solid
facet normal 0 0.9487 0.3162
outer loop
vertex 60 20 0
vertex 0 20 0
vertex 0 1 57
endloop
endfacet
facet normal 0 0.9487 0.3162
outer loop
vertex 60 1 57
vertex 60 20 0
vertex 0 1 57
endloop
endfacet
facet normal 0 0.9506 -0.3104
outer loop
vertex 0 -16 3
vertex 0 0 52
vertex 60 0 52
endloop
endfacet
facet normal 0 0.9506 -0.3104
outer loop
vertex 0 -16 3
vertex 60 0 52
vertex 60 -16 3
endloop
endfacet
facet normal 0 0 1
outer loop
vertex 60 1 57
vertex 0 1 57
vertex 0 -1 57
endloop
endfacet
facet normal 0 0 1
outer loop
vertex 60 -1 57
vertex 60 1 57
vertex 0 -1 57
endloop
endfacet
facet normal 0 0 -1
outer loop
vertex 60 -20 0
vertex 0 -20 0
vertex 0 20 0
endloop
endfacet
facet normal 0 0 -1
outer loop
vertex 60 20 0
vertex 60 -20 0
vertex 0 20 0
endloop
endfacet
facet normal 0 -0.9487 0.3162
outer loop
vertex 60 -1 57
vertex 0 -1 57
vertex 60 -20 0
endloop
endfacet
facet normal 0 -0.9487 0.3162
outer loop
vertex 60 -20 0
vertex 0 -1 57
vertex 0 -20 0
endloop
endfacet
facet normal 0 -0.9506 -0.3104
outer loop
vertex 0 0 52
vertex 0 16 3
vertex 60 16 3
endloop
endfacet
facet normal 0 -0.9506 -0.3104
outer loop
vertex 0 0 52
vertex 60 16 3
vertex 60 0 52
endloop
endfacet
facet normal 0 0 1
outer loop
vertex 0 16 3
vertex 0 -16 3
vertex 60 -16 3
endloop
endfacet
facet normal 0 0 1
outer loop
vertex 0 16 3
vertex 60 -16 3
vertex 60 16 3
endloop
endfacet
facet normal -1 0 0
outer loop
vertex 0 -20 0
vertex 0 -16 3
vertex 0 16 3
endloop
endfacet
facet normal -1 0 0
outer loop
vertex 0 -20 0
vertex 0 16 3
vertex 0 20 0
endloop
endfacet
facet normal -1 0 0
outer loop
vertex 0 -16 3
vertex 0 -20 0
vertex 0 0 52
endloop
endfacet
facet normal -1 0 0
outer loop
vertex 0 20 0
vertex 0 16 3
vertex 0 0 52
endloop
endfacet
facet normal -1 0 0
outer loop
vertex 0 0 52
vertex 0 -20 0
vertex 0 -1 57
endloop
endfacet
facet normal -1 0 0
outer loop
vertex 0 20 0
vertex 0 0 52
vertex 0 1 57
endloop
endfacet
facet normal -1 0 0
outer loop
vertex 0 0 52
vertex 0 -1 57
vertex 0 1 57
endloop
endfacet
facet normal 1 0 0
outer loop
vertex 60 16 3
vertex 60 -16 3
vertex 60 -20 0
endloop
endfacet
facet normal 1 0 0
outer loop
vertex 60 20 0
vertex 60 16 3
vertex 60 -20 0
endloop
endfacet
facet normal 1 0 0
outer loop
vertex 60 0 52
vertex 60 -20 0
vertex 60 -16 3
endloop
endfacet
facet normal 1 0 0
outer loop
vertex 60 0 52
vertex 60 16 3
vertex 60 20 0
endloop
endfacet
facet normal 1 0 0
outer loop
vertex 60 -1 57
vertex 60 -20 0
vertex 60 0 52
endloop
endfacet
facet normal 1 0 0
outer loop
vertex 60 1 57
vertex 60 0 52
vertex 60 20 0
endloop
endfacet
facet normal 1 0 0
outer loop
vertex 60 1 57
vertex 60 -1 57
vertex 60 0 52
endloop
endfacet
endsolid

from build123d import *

# Parameters (mm, degrees)
PAD_DEPTH = 60


with BuildPart() as part:
    # Sketch → Pad (new body)
    with BuildSketch(Plane.YZ):
        Polygon((-20, 0), (20, 0), (1, 57), (-1, 57), align=None)
        Polygon((-16, 3), (16, 3), (0, 52), align=None, mode=Mode.SUBTRACT)
    extrude(amount=PAD_DEPTH)


solid = part.part
